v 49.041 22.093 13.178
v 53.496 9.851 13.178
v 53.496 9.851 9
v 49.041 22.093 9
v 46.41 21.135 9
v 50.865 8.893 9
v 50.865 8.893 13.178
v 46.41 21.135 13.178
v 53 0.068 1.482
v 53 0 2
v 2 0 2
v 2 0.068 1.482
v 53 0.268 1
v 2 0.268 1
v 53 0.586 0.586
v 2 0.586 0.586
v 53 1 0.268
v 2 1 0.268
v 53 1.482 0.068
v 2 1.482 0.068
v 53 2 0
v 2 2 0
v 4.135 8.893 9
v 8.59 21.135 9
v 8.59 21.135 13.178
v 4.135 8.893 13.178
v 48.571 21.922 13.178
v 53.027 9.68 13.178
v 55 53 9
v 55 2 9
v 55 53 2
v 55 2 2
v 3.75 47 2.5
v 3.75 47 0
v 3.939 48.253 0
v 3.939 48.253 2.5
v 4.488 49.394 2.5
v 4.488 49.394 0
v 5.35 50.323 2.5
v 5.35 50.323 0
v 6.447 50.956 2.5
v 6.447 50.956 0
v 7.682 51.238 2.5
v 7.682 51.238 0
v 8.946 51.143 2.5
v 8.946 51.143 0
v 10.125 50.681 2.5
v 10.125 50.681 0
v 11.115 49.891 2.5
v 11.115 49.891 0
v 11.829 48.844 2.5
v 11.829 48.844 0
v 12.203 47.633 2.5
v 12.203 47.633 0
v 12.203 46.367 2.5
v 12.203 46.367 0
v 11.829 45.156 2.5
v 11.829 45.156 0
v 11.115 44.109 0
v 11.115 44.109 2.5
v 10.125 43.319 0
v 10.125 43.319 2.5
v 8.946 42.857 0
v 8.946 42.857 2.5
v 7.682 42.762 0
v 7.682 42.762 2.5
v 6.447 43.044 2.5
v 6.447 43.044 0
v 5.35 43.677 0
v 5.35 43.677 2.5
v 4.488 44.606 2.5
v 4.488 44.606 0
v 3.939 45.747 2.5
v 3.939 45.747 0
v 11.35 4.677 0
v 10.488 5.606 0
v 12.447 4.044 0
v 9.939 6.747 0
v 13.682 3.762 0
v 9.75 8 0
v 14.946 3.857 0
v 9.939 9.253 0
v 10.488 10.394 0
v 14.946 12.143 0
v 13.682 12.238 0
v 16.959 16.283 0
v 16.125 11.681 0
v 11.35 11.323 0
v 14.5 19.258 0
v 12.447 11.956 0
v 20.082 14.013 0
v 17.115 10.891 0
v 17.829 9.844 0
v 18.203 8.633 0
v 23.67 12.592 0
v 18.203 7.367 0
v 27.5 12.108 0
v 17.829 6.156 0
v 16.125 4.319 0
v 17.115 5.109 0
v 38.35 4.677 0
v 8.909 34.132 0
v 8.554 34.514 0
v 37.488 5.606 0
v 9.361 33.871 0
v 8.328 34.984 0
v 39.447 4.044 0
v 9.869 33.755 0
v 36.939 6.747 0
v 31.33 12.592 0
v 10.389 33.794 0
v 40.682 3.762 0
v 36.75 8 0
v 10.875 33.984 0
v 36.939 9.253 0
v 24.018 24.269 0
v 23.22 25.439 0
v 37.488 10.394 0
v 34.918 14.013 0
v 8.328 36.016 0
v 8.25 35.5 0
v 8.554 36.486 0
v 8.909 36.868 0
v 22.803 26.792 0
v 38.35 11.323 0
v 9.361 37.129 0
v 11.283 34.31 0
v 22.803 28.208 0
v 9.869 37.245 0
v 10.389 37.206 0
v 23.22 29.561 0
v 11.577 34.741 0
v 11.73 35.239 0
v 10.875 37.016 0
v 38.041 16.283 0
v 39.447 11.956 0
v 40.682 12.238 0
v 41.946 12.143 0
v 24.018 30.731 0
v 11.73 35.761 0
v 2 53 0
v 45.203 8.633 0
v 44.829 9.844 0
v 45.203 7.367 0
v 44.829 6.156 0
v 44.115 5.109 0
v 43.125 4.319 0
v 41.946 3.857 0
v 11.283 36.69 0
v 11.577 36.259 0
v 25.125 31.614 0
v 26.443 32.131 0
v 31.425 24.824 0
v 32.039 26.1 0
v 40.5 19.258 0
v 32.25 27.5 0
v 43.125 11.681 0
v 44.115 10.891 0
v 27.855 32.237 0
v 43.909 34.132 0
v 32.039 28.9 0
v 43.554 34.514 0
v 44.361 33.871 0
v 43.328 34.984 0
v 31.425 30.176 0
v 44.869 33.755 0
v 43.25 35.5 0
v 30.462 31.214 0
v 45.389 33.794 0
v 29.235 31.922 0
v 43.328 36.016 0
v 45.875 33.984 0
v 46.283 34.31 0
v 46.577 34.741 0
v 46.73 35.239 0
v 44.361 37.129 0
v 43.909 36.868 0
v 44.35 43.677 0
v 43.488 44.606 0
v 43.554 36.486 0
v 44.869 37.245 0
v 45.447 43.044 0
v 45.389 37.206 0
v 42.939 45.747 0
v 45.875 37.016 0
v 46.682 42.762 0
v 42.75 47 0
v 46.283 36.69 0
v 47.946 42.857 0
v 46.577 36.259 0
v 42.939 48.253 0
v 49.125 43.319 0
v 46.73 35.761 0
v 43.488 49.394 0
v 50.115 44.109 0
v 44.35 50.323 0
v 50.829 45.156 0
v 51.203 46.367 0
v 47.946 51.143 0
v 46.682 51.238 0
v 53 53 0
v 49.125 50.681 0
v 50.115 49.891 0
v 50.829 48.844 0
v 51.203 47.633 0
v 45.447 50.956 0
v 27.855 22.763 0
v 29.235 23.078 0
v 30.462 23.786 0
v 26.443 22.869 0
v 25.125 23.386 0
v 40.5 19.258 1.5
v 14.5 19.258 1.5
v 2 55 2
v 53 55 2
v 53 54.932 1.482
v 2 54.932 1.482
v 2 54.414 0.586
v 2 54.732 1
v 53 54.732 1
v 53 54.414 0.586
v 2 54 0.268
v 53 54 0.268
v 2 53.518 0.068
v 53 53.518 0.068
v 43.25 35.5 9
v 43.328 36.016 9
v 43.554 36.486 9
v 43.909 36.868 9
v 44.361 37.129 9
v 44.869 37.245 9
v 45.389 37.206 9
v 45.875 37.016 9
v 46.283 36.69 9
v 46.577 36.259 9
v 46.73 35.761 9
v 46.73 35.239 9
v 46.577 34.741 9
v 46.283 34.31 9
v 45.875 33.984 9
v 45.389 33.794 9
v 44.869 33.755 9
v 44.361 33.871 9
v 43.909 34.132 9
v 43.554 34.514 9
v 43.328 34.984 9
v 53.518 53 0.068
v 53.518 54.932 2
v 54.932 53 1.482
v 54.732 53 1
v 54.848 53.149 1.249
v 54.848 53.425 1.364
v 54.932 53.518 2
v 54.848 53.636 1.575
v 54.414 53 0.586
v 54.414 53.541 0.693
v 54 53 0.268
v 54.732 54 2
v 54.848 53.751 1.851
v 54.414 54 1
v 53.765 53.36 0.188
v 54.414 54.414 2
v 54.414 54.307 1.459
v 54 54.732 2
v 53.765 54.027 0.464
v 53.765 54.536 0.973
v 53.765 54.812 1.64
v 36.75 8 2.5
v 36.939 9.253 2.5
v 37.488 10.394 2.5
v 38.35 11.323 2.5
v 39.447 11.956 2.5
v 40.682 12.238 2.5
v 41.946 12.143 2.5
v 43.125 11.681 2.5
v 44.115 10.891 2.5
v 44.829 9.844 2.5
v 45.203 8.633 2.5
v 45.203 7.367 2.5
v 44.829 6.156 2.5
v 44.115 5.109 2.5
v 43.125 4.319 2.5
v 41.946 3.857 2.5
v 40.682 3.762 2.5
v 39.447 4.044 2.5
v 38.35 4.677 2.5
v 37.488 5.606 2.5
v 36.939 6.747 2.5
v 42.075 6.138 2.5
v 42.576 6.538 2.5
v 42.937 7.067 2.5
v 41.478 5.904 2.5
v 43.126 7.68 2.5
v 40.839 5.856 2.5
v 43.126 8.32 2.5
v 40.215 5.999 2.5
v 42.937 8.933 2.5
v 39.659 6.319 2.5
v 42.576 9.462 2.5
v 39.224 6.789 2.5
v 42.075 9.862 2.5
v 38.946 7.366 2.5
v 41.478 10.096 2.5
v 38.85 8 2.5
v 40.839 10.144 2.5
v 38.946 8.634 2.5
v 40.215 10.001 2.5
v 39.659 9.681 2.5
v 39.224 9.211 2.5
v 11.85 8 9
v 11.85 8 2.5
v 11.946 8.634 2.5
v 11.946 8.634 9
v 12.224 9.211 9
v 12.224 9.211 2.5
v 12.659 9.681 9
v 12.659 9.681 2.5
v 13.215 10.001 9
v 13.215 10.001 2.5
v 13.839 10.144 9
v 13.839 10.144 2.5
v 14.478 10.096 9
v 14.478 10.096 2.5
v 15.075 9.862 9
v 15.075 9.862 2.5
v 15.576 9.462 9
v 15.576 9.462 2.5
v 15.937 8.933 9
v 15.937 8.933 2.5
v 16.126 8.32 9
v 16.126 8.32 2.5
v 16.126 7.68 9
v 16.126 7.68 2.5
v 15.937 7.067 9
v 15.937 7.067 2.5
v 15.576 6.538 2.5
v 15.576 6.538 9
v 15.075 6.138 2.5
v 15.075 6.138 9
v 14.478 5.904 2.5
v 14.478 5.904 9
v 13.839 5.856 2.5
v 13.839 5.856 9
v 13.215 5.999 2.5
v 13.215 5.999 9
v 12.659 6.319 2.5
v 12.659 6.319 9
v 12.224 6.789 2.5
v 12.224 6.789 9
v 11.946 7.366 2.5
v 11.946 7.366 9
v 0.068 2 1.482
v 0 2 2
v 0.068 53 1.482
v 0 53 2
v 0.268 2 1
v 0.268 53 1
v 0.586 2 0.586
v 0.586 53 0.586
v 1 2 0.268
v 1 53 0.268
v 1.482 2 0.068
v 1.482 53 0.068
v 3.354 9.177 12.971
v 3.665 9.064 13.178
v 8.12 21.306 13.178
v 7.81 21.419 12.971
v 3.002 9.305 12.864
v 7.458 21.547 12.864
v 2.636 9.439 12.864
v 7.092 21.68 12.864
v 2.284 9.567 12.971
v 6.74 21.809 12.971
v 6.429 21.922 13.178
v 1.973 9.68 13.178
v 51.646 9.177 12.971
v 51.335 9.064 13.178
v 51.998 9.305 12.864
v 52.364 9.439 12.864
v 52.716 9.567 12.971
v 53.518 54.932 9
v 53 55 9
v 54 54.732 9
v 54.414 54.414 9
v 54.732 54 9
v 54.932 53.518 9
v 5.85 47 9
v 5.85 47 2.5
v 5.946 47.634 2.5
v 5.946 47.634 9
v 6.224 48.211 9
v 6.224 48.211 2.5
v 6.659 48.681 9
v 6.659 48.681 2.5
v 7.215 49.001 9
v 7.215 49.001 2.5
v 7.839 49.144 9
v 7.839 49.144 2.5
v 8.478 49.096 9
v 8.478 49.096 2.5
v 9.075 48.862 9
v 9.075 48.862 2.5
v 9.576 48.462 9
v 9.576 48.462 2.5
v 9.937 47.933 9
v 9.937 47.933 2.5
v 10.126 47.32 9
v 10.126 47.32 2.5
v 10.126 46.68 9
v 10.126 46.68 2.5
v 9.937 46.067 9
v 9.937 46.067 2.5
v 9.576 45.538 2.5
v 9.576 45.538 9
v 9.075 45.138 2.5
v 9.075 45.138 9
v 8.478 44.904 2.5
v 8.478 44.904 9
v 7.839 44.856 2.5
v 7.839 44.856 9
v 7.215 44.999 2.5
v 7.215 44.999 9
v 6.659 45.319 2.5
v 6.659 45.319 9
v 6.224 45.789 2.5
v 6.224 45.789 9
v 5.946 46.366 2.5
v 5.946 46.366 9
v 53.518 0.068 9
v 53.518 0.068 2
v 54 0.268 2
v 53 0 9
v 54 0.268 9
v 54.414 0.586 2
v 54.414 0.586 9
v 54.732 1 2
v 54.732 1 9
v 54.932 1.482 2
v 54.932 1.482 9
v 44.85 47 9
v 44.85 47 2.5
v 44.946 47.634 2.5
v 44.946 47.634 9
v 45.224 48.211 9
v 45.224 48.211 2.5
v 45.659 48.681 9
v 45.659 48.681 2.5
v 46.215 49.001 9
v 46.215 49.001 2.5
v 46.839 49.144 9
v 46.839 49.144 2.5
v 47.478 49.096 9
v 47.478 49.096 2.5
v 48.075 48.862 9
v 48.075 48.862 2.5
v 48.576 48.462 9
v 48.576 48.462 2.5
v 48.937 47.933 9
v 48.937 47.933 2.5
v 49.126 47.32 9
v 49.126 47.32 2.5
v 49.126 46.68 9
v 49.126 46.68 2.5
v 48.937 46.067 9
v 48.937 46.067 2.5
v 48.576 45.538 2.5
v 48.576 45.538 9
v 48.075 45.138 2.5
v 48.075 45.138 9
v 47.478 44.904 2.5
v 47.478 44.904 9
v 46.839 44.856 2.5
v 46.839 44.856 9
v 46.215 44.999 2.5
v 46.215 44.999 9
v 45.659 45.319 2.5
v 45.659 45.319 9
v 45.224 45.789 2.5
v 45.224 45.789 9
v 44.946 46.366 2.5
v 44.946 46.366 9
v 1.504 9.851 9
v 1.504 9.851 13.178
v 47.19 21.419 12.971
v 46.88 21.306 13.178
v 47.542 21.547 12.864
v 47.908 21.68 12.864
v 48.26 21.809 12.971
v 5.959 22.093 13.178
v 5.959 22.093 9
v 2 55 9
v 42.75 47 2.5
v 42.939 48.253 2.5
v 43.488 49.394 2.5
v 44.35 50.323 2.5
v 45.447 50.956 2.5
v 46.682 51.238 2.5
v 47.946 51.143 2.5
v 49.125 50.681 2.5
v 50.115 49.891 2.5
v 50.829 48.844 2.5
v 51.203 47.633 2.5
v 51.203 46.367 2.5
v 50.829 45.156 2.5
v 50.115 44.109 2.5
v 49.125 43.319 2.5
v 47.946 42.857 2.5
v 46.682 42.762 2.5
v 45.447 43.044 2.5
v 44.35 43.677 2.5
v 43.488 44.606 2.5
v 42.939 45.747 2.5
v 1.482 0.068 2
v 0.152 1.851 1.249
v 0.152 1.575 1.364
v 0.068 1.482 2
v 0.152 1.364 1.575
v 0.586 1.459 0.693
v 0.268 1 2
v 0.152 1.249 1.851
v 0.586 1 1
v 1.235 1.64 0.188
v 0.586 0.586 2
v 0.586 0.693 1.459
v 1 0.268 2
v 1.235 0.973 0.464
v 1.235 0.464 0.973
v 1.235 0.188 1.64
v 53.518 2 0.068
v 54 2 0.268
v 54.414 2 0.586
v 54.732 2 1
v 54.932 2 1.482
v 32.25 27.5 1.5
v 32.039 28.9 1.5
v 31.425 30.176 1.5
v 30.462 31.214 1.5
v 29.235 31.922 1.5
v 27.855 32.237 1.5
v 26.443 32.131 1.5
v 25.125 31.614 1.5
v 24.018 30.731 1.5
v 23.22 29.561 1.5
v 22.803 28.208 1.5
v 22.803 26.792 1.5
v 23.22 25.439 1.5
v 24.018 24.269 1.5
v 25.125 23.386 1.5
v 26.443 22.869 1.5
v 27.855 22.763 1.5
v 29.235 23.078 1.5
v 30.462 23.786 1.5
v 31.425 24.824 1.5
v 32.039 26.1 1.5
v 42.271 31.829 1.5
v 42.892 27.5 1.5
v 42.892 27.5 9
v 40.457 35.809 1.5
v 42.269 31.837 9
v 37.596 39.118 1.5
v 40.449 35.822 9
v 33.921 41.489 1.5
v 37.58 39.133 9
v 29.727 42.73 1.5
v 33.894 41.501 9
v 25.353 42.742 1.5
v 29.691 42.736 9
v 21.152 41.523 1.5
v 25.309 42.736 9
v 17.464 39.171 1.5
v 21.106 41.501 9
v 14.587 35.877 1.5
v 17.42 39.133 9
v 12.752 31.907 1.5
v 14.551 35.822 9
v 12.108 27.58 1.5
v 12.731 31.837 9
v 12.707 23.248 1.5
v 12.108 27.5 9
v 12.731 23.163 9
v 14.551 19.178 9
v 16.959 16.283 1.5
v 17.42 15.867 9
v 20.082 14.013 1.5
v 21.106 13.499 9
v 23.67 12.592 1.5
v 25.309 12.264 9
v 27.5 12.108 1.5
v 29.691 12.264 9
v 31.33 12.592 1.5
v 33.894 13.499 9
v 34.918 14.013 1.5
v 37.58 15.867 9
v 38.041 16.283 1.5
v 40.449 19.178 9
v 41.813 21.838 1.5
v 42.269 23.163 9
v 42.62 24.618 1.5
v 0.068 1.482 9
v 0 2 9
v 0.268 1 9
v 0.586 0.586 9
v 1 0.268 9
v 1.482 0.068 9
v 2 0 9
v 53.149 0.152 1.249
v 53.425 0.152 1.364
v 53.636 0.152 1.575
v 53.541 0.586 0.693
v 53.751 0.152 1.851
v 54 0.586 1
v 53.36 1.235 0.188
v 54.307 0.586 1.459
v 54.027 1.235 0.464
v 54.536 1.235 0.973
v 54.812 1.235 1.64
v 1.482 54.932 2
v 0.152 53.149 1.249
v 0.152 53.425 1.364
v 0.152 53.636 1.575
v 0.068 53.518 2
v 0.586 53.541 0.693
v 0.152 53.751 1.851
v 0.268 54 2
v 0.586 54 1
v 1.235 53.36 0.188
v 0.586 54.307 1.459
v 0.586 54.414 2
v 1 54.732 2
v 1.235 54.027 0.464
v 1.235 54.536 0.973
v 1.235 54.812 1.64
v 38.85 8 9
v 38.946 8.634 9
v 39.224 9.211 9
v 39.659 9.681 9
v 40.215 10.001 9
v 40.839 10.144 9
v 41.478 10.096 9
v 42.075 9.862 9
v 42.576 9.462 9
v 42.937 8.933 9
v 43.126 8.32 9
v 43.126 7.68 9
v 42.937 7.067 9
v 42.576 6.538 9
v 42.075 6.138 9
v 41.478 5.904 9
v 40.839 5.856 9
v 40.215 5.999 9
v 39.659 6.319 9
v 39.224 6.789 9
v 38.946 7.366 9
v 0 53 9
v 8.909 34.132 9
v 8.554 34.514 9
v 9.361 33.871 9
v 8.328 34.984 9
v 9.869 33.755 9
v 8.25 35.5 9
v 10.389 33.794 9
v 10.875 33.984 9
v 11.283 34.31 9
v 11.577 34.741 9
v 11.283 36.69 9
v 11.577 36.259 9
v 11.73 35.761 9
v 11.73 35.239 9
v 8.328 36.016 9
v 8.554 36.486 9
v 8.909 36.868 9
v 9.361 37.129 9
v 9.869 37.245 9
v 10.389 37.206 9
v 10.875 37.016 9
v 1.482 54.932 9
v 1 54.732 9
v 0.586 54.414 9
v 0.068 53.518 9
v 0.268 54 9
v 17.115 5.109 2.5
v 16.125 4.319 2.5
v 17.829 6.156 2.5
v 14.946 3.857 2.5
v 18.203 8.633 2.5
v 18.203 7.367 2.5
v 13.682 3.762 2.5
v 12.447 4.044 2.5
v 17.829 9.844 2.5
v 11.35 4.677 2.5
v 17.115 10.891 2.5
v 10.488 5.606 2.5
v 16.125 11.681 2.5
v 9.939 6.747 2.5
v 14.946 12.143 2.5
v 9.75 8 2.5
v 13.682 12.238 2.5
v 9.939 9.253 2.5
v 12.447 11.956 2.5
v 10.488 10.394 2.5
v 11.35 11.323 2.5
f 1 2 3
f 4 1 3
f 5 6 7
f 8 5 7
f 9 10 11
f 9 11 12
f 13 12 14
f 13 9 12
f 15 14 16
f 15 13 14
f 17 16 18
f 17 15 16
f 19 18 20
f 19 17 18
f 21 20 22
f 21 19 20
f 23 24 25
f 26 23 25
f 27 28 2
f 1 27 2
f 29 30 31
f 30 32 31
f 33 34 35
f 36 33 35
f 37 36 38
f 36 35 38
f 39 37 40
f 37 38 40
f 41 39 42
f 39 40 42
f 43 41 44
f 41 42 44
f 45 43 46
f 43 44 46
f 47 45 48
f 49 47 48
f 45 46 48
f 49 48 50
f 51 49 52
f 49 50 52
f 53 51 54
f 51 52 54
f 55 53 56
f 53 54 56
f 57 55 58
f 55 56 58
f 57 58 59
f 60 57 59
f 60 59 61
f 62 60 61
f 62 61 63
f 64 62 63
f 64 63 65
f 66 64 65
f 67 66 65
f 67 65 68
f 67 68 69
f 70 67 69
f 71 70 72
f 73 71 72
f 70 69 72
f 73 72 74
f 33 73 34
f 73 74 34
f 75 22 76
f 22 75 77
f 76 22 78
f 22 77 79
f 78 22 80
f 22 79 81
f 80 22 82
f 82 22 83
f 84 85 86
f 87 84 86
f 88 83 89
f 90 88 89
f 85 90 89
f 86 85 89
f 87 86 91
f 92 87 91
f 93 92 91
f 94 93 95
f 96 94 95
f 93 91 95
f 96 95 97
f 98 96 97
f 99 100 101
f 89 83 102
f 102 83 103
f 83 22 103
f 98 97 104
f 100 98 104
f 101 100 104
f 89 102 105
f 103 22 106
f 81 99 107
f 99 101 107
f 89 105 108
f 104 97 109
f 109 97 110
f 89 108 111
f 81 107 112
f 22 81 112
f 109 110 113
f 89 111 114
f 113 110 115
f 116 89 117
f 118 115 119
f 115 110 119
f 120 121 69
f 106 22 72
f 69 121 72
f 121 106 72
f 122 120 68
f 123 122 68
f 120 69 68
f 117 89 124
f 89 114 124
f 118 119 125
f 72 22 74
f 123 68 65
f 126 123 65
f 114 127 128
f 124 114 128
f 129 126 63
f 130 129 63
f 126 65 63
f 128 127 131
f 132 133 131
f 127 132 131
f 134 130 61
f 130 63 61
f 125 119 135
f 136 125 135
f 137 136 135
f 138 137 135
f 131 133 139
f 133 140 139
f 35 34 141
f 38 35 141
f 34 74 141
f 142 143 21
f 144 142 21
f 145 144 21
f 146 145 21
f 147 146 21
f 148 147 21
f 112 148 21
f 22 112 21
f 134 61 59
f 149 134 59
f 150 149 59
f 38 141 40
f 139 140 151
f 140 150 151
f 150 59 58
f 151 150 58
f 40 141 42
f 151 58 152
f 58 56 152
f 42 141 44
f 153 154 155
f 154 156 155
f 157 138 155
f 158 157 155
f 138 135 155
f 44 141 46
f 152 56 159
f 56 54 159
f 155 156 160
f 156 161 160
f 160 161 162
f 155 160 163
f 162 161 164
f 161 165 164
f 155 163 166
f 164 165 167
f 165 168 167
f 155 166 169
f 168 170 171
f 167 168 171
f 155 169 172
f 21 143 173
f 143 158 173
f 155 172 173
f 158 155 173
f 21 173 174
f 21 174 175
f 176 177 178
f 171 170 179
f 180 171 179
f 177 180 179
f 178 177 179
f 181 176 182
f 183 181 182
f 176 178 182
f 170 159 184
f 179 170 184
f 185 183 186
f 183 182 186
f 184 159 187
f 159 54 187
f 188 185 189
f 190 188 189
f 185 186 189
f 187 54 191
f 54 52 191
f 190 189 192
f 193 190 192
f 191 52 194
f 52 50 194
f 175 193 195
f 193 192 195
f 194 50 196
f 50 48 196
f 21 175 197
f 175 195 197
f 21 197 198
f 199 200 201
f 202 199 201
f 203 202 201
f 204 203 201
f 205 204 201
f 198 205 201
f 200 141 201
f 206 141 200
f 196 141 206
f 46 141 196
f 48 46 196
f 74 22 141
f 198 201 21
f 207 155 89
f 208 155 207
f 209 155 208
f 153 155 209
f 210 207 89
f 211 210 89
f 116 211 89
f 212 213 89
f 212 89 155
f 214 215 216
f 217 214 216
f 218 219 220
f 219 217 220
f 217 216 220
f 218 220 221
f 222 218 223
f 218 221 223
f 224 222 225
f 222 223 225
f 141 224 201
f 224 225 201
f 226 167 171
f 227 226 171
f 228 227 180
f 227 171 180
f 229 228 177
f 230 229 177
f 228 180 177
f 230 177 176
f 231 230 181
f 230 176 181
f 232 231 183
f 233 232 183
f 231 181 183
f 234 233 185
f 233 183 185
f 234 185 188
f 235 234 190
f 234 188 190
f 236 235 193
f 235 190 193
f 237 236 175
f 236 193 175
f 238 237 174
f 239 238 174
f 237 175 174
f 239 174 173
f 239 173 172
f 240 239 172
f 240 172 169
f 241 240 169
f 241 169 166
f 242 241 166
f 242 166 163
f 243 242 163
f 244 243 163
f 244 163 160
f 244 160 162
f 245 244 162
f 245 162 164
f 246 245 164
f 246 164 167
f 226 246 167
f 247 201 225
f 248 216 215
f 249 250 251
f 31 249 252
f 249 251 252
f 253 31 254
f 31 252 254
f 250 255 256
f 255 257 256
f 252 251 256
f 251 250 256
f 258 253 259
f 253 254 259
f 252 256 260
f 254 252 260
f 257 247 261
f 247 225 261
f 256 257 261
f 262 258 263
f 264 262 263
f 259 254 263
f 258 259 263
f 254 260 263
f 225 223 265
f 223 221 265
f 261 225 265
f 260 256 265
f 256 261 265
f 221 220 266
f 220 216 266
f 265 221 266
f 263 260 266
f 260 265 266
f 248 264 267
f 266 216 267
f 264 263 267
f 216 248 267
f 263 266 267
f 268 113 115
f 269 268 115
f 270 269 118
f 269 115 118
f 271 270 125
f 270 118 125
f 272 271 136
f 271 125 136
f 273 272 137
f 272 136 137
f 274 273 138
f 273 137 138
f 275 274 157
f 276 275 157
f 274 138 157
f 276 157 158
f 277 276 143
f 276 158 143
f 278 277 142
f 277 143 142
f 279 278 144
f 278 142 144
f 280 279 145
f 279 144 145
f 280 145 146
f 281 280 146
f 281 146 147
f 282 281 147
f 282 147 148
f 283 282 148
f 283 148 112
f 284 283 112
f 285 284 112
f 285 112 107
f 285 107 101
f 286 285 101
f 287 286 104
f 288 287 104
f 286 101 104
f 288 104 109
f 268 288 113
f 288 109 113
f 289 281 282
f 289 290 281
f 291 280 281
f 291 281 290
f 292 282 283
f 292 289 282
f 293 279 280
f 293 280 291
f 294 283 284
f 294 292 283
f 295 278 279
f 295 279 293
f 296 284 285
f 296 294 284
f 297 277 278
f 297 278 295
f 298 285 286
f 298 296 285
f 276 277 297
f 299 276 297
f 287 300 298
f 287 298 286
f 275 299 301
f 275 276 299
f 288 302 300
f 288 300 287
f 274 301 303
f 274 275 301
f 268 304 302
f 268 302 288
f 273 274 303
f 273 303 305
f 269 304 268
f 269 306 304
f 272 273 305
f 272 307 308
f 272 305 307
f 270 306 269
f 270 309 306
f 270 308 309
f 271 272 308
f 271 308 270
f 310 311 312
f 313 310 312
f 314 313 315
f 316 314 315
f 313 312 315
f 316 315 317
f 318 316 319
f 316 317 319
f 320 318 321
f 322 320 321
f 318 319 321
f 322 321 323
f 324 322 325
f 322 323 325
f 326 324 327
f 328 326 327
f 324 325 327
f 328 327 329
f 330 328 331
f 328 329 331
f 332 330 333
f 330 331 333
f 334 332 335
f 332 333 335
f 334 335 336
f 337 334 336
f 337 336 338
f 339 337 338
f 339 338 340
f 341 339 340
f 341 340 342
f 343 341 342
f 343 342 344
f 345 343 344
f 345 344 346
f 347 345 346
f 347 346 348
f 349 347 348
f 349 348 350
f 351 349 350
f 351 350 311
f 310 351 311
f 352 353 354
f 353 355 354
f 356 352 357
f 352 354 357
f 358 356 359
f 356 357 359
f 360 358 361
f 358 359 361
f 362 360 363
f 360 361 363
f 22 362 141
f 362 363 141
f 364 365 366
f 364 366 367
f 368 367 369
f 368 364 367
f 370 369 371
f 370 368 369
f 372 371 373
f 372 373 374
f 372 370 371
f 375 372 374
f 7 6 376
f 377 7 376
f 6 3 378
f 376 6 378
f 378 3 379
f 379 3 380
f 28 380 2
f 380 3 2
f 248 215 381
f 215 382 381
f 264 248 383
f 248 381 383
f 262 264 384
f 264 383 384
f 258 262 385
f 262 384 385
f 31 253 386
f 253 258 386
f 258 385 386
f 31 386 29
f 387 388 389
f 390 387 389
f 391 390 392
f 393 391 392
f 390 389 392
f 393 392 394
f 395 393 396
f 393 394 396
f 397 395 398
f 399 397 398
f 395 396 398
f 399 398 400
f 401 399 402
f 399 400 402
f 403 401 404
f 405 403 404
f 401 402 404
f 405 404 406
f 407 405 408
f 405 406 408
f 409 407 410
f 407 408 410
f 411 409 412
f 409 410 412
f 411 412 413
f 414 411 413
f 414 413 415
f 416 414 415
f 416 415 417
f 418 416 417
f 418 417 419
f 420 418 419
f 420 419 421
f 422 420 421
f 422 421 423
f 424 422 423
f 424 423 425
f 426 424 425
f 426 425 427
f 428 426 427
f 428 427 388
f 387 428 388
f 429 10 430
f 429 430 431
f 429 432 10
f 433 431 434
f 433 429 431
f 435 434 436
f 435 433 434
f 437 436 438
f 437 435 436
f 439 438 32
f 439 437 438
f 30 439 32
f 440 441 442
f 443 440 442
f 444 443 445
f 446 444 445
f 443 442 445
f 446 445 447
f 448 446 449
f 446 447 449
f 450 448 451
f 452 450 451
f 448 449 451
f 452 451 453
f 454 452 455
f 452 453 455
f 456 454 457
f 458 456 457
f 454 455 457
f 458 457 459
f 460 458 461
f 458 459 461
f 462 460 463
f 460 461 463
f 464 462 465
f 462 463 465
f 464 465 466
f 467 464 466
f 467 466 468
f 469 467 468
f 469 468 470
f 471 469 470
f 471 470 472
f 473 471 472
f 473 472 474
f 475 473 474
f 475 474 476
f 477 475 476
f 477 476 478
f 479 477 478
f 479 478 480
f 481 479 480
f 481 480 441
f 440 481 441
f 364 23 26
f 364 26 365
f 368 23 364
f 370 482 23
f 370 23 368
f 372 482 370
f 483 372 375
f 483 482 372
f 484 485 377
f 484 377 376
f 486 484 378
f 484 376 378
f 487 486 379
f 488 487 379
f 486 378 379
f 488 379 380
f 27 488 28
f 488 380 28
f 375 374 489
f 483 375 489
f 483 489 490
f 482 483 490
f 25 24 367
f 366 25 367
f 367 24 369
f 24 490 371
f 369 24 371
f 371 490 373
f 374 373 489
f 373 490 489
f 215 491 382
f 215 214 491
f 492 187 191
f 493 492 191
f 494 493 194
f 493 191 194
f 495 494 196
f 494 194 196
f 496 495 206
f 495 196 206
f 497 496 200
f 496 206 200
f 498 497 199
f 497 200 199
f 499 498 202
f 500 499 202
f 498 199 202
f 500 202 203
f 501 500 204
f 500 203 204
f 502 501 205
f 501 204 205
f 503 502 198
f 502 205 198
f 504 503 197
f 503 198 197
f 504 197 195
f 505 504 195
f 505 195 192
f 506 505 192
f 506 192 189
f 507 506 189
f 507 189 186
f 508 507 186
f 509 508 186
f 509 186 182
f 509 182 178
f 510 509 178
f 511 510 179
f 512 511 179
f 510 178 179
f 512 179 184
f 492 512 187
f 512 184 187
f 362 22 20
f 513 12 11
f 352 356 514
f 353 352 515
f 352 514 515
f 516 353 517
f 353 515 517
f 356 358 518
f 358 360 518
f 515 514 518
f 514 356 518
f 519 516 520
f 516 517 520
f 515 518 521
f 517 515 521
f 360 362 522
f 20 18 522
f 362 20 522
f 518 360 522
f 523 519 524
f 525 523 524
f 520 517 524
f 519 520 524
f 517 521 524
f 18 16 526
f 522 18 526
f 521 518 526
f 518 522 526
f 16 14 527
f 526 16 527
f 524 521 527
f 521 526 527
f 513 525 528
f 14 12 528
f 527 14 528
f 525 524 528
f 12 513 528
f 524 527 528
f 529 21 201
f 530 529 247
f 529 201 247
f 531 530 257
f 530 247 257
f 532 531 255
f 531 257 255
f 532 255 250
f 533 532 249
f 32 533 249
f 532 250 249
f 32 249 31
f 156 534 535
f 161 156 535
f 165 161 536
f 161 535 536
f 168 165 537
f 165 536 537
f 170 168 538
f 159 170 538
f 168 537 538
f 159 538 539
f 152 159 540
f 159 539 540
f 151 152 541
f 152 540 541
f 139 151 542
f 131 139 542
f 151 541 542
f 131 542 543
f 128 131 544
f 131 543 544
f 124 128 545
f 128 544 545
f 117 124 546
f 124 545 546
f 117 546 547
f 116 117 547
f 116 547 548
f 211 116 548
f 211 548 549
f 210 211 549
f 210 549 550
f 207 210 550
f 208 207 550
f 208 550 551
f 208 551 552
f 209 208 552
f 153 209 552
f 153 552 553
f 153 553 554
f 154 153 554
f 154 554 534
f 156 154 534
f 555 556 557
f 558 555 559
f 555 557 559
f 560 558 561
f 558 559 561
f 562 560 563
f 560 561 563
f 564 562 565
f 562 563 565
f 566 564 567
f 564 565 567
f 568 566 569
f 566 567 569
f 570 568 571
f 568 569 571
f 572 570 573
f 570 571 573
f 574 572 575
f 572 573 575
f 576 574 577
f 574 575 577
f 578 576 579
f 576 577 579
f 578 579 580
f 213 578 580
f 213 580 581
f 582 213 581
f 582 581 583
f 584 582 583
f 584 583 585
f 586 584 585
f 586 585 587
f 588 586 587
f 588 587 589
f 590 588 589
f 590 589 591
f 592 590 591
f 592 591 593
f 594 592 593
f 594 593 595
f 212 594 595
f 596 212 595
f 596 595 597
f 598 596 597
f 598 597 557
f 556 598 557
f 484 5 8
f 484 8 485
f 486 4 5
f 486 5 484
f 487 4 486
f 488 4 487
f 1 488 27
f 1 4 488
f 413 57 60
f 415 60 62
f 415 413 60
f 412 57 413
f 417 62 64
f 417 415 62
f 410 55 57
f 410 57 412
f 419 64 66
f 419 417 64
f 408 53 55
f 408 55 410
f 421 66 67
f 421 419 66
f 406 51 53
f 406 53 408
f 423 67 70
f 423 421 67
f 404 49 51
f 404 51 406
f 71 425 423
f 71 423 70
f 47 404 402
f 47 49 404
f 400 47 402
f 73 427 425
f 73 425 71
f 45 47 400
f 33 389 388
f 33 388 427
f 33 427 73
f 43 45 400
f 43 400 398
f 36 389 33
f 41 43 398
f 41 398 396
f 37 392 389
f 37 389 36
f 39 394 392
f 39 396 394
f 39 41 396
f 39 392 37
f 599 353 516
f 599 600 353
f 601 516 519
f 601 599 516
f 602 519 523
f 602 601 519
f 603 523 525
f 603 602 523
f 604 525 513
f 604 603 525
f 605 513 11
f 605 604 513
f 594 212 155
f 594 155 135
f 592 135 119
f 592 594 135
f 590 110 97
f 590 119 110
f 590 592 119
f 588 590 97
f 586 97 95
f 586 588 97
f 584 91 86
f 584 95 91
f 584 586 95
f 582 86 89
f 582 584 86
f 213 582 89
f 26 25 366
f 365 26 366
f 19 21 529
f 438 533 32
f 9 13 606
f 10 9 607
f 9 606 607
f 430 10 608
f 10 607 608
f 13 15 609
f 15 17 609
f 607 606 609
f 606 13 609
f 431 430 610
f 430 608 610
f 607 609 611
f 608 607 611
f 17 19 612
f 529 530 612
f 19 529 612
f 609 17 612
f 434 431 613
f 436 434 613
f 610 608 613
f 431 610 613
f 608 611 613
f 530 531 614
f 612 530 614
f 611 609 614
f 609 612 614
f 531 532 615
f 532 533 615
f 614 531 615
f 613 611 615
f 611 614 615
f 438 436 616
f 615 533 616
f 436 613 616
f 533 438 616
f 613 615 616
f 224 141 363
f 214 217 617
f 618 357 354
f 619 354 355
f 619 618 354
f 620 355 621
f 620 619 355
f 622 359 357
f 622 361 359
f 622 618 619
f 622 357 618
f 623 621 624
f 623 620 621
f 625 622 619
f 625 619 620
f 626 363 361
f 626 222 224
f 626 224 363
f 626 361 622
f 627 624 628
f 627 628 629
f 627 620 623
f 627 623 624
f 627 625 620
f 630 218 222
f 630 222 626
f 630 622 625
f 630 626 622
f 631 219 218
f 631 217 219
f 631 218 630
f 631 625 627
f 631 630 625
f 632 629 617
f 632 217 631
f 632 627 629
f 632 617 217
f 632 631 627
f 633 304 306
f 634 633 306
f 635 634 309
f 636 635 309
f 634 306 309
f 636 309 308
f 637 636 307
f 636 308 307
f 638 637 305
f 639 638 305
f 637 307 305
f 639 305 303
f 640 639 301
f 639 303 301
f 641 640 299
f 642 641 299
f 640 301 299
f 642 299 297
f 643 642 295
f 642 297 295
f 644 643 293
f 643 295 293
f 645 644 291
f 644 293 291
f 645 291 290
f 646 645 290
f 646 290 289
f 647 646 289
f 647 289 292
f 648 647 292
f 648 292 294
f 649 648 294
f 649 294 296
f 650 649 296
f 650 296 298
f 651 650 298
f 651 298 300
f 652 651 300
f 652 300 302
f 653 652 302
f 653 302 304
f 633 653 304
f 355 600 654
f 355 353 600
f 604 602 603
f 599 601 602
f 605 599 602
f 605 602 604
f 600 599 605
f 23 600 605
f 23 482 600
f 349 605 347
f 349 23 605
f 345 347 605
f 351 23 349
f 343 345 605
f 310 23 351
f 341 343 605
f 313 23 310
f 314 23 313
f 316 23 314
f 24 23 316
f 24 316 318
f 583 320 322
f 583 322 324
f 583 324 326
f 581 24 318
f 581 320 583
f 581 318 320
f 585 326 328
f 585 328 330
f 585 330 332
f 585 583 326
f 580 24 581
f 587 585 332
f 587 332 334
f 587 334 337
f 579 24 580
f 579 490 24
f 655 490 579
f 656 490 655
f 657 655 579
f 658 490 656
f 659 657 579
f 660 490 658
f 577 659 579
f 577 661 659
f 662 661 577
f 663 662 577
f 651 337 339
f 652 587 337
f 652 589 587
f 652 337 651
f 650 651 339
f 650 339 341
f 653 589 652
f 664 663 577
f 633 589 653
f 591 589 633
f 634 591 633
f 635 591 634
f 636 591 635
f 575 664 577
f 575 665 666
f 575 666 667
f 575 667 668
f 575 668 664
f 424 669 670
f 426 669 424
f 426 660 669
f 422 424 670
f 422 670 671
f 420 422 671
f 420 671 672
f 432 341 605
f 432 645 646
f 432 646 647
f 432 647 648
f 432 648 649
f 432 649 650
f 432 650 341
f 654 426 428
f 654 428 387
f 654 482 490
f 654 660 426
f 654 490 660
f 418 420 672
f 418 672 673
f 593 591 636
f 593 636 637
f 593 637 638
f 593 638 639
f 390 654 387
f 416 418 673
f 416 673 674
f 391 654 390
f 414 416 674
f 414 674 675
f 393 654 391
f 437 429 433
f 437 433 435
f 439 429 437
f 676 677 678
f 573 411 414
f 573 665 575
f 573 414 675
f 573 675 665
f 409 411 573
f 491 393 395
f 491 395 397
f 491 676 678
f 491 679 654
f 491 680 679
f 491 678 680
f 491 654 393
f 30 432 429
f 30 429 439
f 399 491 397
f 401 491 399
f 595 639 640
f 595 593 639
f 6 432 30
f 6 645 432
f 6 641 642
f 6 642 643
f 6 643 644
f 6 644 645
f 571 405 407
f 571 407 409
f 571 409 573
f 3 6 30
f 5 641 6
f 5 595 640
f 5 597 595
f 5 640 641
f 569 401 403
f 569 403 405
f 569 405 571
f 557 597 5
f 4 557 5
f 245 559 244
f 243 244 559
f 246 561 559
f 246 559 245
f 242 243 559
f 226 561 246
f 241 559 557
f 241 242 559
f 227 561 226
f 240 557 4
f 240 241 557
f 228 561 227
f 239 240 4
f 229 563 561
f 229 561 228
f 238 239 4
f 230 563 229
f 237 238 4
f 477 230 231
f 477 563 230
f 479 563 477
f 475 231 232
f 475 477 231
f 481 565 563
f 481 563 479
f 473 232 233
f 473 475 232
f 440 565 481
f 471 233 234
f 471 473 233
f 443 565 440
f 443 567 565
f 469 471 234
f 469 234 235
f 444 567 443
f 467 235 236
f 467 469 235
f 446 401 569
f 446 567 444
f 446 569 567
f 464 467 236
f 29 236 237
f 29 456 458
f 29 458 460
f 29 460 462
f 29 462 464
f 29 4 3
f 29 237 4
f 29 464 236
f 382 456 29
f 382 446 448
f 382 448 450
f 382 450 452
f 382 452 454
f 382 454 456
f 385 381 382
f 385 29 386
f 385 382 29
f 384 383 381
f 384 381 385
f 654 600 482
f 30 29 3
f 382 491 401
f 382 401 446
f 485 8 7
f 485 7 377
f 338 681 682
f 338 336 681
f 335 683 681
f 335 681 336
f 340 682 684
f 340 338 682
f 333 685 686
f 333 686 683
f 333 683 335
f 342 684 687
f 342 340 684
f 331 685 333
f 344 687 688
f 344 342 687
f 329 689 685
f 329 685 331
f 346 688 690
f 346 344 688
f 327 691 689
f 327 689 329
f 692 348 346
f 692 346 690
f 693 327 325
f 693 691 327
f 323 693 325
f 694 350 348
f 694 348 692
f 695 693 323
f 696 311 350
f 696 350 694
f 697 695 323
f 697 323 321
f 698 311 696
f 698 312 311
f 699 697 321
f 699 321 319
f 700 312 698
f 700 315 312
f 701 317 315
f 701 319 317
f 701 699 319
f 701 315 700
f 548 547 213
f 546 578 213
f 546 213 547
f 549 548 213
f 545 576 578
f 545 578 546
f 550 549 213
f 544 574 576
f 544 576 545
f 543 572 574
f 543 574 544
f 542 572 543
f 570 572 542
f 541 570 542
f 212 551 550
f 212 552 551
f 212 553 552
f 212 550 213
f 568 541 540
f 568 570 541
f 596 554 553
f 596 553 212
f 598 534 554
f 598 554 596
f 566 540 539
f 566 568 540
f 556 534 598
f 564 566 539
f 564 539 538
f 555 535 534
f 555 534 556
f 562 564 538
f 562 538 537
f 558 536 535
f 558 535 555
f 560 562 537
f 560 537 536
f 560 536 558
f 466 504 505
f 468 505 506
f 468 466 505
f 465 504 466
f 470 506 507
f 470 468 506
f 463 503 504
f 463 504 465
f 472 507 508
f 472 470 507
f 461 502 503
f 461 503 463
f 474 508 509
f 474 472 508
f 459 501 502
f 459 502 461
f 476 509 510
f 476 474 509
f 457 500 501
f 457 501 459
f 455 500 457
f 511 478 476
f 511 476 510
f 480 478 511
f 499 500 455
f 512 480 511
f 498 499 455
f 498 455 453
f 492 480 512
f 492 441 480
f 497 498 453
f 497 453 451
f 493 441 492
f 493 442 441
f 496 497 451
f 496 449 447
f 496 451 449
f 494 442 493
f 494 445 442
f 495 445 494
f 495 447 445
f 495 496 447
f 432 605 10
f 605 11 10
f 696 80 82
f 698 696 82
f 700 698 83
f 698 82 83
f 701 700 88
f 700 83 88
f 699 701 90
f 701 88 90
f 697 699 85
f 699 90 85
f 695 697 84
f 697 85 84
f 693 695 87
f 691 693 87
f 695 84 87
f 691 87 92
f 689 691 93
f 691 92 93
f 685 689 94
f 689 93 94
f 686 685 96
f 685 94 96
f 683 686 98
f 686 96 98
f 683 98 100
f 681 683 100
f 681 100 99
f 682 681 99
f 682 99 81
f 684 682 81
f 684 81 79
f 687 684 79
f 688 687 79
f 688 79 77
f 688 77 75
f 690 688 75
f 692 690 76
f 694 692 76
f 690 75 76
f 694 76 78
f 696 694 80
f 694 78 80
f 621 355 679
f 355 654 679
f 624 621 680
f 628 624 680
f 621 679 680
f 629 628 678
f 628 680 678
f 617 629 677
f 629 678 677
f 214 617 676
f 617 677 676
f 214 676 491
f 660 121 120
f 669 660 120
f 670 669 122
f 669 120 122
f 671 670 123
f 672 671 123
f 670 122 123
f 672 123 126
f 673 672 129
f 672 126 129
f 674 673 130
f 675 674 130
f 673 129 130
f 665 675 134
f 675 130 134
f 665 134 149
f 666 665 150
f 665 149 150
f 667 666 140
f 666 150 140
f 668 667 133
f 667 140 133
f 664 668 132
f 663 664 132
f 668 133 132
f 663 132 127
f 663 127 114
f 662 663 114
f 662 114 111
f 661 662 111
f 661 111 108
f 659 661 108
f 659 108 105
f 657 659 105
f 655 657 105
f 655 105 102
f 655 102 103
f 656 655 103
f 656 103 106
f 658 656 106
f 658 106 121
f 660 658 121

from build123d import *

# Parameters (mm, degrees)
SKETCH1_W           = 55
SKETCH1_H           = 55
BOSS_EXTRUDE1_DEPTH = 9
SKETCH3_R           = 1.75
SKETCH3_R_2         = 2.15
CUT_EXTRUDE1_DEPTH  = 79.300702423
FILLET1_R           = 2
SKETCH4_R           = 4.25
CUT_EXTRUDE2_DEPTH  = 2.5
BOSS_EXTRUDE2_DEPTH = 13.027575483
BOSS_EXTRUDE3_DEPTH = 13.027575483
SKETCH7_R           = 15.392304845
CUT_EXTRUDE3_DEPTH  = 7.5
SKETCH8_R           = 4.75
CUT_EXTRUDE4_DEPTH  = 79.653460169
CUT_EXTRUDE5_DEPTH  = 79.653460169


with BuildPart() as part:
    # Sketch1 → Boss-Extrude1 (new body)
    with BuildSketch(Plane.XY):
        with Locations((27.5, 27.5)):
            Rectangle(SKETCH1_W, SKETCH1_H)
    extrude(amount=BOSS_EXTRUDE1_DEPTH)

    # Sketch3 → Cut-Extrude1 (cut, through all)
    with BuildSketch(Plane(origin=(0, 0, 0), x_dir=(-1, 0, 0), z_dir=(0, 0, -1))):
        with Locations((-45, 35.5)):
            Circle(SKETCH3_R)
        with Locations((-47, 47)):
            Circle(SKETCH3_R_2)
        with Locations((-8, 47)):
            Circle(SKETCH3_R_2)
        with Locations((-14, 8)):
            Circle(SKETCH3_R_2)
        with Locations((-41, 8)):
            Circle(SKETCH3_R_2)
        with Locations((-10, 35.5)):
            Circle(SKETCH3_R)
    extrude(amount=-CUT_EXTRUDE1_DEPTH, mode=Mode.SUBTRACT)

    # Fillet1
    fillet1_edges = [part.edges().sort_by_distance(p)[0] for p in [
        (27.5, 55, 0),
        (55, 27.5, 0),
        (27.5, 0, 0),
        (0, 27.5, 0),
        (0, 55, 4.5),
        (55, 55, 4.5),
        (55, 0, 4.5),
        (0, 0, 4.5),
    ]]
    fillet(fillet1_edges, radius=FILLET1_R)

    # Sketch4 → Cut-Extrude2 (cut)
    with BuildSketch(Plane(origin=(0, 0, 0), x_dir=(-1, 0, 0), z_dir=(0, 0, -1))):
        with Locations((-47, 47)):
            Circle(SKETCH4_R)
        with Locations((-8, 47)):
            Circle(SKETCH4_R)
        with Locations((-14, 8)):
            Circle(SKETCH4_R)
        with Locations((-41, 8)):
            Circle(SKETCH4_R)
    extrude(amount=-CUT_EXTRUDE2_DEPTH, mode=Mode.SUBTRACT)

    # Sketch5 → Boss-Extrude2 (add)
    with BuildSketch(Plane(origin=(3.091937938, -8.495029668, 0), x_dir=(0, 0, 1), z_dir=(-0.3420201433256653, 0.9396926207859098, 0))):
        with BuildLine():
            Line((13.177619471, 53.639405858), (9, 53.639405858))
            Line((9, 53.639405858), (9, 50.839405858))
            Line((9, 50.839405858), (13.177619471, 50.839405858))
            Line((13.177619471, 50.839405858), (13.177619471, 51.339405858))
            ThreePointArc((13.177619471, 51.339405858), (12.85, 52.239405858), (13.177619471, 53.139405858))
            Line((13.177619471, 53.139405858), (13.177619471, 53.639405858))
        make_face()
    extrude(amount=BOSS_EXTRUDE2_DEPTH)

    # Sketch6 → Boss-Extrude3 (add)
    with BuildSketch(Plane(origin=(3.341839876, 9.181629599, 0), x_dir=(0, 0, 1), z_dir=(-0.3420201433256654, -0.9396926207859095, 0))):
        with BuildLine():
            Line((13.177619471, 1.956311715), (9, 1.956311715))
            Line((9, 1.956311715), (9, -0.843688285))
            Line((9, -0.843688285), (13.177619471, -0.843688285))
            Line((13.177619471, -0.843688285), (13.177619471, -0.343688285))
            ThreePointArc((13.177619471, -0.343688285), (12.85, 0.556311715), (13.177619471, 1.456311715))
            Line((13.177619471, 1.456311715), (13.177619471, 1.956311715))
        make_face()
    extrude(amount=-BOSS_EXTRUDE3_DEPTH)

    # Sketch7 → Cut-Extrude3 (cut)
    with BuildSketch(Plane.XY.offset(9)):
        with Locations((27.5, 27.5)):
            Circle(SKETCH7_R)
    extrude(amount=-CUT_EXTRUDE3_DEPTH, mode=Mode.SUBTRACT)

    # Sketch8 → Cut-Extrude4 (cut, through all)
    with BuildSketch(Plane.XY.offset(1.5)):
        with Locations((27.5, 27.5)):
            Circle(SKETCH8_R)
    extrude(amount=-CUT_EXTRUDE4_DEPTH, mode=Mode.SUBTRACT)

    # Sketch10 → Cut-Extrude5 (cut, through all)
    with BuildSketch(Plane.XY.offset(1.5)):
        with BuildLine():
            Line((14.5, 19.258455942), (40.5, 19.258455942))
            ThreePointArc((40.5, 19.258455942), (27.5, 12.107695155), (14.5, 19.258455942))
        make_face()
    extrude(amount=-CUT_EXTRUDE5_DEPTH, mode=Mode.SUBTRACT)


solid = part.part
